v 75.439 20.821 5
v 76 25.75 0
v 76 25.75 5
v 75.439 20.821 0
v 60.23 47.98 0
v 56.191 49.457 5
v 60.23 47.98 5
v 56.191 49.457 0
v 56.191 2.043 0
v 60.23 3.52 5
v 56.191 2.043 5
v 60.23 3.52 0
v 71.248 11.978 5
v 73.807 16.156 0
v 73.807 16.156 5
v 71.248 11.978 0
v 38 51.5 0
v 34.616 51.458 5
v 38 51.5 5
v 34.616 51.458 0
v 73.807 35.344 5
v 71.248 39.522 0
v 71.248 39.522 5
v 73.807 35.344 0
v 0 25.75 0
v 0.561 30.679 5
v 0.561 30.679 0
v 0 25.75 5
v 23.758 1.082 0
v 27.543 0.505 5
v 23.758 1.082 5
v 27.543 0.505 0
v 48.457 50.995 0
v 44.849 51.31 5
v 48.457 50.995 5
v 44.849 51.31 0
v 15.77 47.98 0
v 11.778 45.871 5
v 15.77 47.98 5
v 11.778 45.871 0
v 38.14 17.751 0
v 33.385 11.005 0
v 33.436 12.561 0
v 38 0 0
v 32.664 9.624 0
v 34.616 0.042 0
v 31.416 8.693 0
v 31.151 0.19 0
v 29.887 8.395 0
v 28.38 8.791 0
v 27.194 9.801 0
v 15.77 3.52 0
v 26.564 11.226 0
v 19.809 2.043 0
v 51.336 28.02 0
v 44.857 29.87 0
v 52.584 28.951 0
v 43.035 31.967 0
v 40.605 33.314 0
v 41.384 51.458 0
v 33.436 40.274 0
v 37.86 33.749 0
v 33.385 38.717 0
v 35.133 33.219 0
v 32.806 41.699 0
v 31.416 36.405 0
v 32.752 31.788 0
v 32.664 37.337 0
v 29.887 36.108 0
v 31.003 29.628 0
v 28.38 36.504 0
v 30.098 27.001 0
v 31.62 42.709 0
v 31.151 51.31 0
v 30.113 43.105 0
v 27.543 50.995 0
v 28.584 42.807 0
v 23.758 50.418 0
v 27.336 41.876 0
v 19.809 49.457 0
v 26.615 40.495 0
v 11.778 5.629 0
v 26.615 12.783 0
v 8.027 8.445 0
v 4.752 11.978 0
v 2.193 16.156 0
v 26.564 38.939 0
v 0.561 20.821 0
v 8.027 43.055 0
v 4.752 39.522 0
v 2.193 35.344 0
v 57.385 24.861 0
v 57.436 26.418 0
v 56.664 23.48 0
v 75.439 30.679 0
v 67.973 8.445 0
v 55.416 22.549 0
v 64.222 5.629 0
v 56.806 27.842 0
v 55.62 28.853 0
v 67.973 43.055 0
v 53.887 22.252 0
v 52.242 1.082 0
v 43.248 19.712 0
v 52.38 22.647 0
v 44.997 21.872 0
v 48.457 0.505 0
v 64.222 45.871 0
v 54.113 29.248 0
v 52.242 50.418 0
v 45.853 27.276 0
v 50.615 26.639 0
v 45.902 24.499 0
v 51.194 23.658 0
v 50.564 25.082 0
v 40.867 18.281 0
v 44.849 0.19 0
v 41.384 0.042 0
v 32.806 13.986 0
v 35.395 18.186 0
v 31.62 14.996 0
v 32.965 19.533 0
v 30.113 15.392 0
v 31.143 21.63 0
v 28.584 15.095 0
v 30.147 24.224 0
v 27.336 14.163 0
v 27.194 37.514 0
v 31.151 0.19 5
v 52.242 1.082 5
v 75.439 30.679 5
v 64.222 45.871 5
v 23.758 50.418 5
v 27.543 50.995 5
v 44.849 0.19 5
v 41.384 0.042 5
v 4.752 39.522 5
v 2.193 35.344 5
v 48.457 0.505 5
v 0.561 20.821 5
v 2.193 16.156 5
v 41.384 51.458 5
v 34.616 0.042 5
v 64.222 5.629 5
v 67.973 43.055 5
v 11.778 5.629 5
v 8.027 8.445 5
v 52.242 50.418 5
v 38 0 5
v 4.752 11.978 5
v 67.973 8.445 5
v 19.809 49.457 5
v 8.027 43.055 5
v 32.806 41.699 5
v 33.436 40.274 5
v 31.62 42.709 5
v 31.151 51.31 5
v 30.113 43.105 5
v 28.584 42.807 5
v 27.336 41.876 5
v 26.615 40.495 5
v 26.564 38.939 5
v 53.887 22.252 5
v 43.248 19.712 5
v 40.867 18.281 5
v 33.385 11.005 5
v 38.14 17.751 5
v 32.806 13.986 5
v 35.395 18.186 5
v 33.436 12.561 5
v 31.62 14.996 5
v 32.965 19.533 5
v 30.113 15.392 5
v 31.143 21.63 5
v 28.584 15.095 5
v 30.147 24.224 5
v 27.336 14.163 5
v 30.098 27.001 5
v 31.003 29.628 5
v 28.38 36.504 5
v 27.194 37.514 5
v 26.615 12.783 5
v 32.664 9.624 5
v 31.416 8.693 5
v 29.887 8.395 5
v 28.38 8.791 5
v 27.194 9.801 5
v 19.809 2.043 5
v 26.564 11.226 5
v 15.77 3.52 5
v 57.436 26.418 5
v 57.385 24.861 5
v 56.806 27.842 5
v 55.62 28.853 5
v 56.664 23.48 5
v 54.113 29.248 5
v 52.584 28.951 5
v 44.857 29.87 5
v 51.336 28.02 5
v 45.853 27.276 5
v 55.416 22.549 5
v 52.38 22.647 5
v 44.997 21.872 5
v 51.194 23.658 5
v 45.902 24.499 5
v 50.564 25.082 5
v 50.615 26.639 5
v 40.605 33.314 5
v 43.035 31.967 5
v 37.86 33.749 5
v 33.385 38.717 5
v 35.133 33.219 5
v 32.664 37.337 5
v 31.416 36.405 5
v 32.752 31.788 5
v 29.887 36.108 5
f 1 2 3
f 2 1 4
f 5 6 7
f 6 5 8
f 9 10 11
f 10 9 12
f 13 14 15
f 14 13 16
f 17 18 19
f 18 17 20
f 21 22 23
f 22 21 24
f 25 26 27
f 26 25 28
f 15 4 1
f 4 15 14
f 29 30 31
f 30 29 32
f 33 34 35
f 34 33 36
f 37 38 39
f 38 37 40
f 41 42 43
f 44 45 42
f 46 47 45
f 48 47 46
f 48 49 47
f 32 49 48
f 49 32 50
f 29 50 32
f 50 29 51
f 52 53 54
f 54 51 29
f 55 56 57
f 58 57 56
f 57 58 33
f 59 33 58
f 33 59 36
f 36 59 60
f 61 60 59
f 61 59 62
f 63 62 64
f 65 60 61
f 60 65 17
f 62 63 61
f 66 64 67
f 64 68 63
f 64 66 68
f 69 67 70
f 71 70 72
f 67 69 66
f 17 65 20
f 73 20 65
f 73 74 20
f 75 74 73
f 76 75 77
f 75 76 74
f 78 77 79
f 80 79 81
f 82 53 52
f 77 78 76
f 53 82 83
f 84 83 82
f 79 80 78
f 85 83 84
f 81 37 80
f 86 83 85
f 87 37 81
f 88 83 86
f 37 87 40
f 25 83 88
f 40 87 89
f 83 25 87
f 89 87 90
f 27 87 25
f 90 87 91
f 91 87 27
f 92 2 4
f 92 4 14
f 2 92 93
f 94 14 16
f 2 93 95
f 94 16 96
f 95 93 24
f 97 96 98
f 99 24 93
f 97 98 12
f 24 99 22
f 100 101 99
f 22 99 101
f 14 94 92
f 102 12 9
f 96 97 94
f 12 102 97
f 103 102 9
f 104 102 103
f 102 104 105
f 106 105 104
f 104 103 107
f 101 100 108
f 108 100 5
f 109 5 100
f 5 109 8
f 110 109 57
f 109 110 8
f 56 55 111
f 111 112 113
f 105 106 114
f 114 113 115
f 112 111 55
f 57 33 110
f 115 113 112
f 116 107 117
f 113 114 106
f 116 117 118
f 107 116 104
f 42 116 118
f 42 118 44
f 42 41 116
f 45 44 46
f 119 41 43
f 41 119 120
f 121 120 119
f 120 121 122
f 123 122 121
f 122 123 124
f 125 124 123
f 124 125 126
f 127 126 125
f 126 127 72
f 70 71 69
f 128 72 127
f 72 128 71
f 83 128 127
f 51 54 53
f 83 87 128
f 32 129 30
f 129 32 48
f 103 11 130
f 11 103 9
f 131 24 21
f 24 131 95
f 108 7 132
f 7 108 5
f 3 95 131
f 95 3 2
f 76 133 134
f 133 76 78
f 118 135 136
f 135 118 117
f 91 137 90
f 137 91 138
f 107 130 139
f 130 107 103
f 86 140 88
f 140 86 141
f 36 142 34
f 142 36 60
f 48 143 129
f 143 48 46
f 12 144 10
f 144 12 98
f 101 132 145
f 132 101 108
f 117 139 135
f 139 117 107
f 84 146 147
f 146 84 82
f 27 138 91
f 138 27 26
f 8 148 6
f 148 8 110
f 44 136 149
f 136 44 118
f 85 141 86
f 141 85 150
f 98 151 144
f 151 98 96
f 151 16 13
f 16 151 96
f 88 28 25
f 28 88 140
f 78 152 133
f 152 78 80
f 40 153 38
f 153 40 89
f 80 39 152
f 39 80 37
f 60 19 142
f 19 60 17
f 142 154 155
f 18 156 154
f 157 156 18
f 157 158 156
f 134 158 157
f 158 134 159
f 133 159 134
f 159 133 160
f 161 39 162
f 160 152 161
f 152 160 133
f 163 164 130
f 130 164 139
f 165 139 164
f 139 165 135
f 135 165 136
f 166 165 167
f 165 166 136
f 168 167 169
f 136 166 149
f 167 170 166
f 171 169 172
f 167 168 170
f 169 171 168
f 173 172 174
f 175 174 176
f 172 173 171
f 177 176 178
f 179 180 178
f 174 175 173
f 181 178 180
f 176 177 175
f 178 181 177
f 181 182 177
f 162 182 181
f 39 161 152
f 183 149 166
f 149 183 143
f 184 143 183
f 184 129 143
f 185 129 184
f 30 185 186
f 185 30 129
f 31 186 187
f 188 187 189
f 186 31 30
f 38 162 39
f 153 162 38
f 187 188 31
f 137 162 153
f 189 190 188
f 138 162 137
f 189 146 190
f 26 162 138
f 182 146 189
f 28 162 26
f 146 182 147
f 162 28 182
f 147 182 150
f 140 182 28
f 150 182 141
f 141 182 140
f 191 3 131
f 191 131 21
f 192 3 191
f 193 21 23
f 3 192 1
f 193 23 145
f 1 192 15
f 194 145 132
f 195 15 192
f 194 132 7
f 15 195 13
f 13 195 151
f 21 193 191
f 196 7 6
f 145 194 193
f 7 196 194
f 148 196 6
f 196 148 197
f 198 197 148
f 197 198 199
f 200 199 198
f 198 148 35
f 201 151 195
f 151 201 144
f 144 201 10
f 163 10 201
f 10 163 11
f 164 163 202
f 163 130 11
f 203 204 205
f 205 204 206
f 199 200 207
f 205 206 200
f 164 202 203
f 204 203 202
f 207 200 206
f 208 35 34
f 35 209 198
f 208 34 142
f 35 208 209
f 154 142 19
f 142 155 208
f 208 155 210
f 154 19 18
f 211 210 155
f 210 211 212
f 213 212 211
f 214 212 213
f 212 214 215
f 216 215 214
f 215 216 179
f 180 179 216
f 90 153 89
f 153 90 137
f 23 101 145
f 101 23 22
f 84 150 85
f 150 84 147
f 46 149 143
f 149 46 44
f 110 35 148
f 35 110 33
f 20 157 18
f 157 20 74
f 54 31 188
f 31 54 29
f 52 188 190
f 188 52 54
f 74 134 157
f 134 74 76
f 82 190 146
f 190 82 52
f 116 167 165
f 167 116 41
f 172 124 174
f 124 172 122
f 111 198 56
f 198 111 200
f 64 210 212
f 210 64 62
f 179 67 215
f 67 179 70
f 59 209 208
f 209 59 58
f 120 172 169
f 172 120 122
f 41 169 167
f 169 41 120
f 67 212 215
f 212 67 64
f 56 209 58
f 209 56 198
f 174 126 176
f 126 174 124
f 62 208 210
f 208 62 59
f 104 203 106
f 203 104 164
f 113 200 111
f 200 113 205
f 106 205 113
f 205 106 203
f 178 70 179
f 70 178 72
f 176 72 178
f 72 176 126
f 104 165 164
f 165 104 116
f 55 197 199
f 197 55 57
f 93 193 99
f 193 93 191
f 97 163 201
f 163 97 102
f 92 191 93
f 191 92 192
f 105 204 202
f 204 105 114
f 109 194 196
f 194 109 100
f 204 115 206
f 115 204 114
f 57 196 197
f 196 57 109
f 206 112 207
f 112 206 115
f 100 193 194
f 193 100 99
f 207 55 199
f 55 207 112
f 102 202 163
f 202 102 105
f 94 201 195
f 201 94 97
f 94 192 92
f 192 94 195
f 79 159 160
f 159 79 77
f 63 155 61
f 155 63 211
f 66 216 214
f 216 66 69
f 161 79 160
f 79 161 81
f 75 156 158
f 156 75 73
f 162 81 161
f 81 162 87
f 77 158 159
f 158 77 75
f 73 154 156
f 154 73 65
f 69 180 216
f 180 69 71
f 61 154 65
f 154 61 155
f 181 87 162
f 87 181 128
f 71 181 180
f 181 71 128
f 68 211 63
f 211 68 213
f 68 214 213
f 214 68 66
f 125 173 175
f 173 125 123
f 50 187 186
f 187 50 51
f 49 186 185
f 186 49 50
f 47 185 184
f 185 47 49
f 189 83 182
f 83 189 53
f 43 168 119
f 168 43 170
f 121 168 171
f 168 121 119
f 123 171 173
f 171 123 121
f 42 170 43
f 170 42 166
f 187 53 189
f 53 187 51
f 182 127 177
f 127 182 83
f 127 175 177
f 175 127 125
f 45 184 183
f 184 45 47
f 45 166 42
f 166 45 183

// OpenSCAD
$fn = 32;

// ----------------------------------------------------------------------
// Cam plate: double_lobe cam, base R24
// ----------------------------------------------------------------------

// --- parameters (mm) ---
base_r = 24;              // base circle radius
lobe_h = 14;              // cam lobe rise
bore_r = 8;               // shaft bore radius
plate_t = 5;              // plate thickness, Z (extrusion height)
ring_r = 16;              // lightening ring radius
bolt_r = 3.5;             // lightening hole radius

profile = [[76, 25.75], [75.439, 30.679], [73.807, 35.344], [71.248, 39.522], [67.973, 43.055], [64.222, 45.871], [60.23, 47.98], [56.191, 49.457], [52.242, 50.418], [48.457, 50.995], [44.849, 51.31], [41.384, 51.458], [38, 51.5], [34.616, 51.458], [31.151, 51.31], [27.543, 50.995], [23.758, 50.418], [19.809, 49.457], [15.77, 47.98], [11.778, 45.871], [8.027, 43.055], [4.752, 39.522], [2.193, 35.344], [0.561, 30.679], [0, 25.75], [0.561, 20.821], [2.193, 16.156], [4.752, 11.978], [8.027, 8.445], [11.778, 5.629], [15.77, 3.52], [19.809, 2.043], [23.758, 1.082], [27.543, 0.505], [31.151, 0.19], [34.616, 0.042], [38, 0], [41.384, 0.042], [44.849, 0.19], [48.457, 0.505], [52.242, 1.082], [56.191, 2.043], [60.23, 3.52], [64.222, 5.629], [67.973, 8.445], [71.248, 11.978], [73.807, 16.156], [75.439, 20.821]];  // primary outline, 48 points, counter clockwise
void_1 = [[45.853, 27.276], [44.857, 29.87], [43.035, 31.967], [40.605, 33.314], [37.86, 33.749], [35.133, 33.219], [32.752, 31.788], [31.003, 29.628], [30.098, 27.001], [30.147, 24.224], [31.143, 21.63], [32.965, 19.533], [35.395, 18.186], [38.14, 17.751], [40.867, 18.281], [43.248, 19.712], [44.997, 21.872], [45.902, 24.499]];  // shaft bore, 18 points
void_2 = [[57.436, 26.418], [56.806, 27.842], [55.62, 28.853], [54.113, 29.248], [52.584, 28.951], [51.336, 28.02], [50.615, 26.639], [50.564, 25.082], [51.194, 23.658], [52.38, 22.647], [53.887, 22.252], [55.416, 22.549], [56.664, 23.48], [57.385, 24.861]];  // lightening hole 1, 14 points
void_3 = [[33.436, 40.274], [32.806, 41.699], [31.62, 42.709], [30.113, 43.105], [28.584, 42.807], [27.336, 41.876], [26.615, 40.495], [26.564, 38.939], [27.194, 37.514], [28.38, 36.504], [29.887, 36.108], [31.416, 36.405], [32.664, 37.337], [33.385, 38.717]];  // lightening hole 2, 14 points
void_4 = [[33.436, 12.561], [32.806, 13.986], [31.62, 14.996], [30.113, 15.392], [28.584, 15.095], [27.336, 14.163], [26.615, 12.783], [26.564, 11.226], [27.194, 9.801], [28.38, 8.791], [29.887, 8.395], [31.416, 8.693], [32.664, 9.624], [33.385, 11.005]];  // lightening hole 3, 14 points

// --- the one profile operation ---
difference() {
  linear_extrude(height = plate_t) polygon(points = profile);
  translate([0, 0, -1])
    linear_extrude(height = plate_t + 2) polygon(points = void_1);
  translate([0, 0, -1])
    linear_extrude(height = plate_t + 2) polygon(points = void_2);
  translate([0, 0, -1])
    linear_extrude(height = plate_t + 2) polygon(points = void_3);
  translate([0, 0, -1])
    linear_extrude(height = plate_t + 2) polygon(points = void_4);
}
